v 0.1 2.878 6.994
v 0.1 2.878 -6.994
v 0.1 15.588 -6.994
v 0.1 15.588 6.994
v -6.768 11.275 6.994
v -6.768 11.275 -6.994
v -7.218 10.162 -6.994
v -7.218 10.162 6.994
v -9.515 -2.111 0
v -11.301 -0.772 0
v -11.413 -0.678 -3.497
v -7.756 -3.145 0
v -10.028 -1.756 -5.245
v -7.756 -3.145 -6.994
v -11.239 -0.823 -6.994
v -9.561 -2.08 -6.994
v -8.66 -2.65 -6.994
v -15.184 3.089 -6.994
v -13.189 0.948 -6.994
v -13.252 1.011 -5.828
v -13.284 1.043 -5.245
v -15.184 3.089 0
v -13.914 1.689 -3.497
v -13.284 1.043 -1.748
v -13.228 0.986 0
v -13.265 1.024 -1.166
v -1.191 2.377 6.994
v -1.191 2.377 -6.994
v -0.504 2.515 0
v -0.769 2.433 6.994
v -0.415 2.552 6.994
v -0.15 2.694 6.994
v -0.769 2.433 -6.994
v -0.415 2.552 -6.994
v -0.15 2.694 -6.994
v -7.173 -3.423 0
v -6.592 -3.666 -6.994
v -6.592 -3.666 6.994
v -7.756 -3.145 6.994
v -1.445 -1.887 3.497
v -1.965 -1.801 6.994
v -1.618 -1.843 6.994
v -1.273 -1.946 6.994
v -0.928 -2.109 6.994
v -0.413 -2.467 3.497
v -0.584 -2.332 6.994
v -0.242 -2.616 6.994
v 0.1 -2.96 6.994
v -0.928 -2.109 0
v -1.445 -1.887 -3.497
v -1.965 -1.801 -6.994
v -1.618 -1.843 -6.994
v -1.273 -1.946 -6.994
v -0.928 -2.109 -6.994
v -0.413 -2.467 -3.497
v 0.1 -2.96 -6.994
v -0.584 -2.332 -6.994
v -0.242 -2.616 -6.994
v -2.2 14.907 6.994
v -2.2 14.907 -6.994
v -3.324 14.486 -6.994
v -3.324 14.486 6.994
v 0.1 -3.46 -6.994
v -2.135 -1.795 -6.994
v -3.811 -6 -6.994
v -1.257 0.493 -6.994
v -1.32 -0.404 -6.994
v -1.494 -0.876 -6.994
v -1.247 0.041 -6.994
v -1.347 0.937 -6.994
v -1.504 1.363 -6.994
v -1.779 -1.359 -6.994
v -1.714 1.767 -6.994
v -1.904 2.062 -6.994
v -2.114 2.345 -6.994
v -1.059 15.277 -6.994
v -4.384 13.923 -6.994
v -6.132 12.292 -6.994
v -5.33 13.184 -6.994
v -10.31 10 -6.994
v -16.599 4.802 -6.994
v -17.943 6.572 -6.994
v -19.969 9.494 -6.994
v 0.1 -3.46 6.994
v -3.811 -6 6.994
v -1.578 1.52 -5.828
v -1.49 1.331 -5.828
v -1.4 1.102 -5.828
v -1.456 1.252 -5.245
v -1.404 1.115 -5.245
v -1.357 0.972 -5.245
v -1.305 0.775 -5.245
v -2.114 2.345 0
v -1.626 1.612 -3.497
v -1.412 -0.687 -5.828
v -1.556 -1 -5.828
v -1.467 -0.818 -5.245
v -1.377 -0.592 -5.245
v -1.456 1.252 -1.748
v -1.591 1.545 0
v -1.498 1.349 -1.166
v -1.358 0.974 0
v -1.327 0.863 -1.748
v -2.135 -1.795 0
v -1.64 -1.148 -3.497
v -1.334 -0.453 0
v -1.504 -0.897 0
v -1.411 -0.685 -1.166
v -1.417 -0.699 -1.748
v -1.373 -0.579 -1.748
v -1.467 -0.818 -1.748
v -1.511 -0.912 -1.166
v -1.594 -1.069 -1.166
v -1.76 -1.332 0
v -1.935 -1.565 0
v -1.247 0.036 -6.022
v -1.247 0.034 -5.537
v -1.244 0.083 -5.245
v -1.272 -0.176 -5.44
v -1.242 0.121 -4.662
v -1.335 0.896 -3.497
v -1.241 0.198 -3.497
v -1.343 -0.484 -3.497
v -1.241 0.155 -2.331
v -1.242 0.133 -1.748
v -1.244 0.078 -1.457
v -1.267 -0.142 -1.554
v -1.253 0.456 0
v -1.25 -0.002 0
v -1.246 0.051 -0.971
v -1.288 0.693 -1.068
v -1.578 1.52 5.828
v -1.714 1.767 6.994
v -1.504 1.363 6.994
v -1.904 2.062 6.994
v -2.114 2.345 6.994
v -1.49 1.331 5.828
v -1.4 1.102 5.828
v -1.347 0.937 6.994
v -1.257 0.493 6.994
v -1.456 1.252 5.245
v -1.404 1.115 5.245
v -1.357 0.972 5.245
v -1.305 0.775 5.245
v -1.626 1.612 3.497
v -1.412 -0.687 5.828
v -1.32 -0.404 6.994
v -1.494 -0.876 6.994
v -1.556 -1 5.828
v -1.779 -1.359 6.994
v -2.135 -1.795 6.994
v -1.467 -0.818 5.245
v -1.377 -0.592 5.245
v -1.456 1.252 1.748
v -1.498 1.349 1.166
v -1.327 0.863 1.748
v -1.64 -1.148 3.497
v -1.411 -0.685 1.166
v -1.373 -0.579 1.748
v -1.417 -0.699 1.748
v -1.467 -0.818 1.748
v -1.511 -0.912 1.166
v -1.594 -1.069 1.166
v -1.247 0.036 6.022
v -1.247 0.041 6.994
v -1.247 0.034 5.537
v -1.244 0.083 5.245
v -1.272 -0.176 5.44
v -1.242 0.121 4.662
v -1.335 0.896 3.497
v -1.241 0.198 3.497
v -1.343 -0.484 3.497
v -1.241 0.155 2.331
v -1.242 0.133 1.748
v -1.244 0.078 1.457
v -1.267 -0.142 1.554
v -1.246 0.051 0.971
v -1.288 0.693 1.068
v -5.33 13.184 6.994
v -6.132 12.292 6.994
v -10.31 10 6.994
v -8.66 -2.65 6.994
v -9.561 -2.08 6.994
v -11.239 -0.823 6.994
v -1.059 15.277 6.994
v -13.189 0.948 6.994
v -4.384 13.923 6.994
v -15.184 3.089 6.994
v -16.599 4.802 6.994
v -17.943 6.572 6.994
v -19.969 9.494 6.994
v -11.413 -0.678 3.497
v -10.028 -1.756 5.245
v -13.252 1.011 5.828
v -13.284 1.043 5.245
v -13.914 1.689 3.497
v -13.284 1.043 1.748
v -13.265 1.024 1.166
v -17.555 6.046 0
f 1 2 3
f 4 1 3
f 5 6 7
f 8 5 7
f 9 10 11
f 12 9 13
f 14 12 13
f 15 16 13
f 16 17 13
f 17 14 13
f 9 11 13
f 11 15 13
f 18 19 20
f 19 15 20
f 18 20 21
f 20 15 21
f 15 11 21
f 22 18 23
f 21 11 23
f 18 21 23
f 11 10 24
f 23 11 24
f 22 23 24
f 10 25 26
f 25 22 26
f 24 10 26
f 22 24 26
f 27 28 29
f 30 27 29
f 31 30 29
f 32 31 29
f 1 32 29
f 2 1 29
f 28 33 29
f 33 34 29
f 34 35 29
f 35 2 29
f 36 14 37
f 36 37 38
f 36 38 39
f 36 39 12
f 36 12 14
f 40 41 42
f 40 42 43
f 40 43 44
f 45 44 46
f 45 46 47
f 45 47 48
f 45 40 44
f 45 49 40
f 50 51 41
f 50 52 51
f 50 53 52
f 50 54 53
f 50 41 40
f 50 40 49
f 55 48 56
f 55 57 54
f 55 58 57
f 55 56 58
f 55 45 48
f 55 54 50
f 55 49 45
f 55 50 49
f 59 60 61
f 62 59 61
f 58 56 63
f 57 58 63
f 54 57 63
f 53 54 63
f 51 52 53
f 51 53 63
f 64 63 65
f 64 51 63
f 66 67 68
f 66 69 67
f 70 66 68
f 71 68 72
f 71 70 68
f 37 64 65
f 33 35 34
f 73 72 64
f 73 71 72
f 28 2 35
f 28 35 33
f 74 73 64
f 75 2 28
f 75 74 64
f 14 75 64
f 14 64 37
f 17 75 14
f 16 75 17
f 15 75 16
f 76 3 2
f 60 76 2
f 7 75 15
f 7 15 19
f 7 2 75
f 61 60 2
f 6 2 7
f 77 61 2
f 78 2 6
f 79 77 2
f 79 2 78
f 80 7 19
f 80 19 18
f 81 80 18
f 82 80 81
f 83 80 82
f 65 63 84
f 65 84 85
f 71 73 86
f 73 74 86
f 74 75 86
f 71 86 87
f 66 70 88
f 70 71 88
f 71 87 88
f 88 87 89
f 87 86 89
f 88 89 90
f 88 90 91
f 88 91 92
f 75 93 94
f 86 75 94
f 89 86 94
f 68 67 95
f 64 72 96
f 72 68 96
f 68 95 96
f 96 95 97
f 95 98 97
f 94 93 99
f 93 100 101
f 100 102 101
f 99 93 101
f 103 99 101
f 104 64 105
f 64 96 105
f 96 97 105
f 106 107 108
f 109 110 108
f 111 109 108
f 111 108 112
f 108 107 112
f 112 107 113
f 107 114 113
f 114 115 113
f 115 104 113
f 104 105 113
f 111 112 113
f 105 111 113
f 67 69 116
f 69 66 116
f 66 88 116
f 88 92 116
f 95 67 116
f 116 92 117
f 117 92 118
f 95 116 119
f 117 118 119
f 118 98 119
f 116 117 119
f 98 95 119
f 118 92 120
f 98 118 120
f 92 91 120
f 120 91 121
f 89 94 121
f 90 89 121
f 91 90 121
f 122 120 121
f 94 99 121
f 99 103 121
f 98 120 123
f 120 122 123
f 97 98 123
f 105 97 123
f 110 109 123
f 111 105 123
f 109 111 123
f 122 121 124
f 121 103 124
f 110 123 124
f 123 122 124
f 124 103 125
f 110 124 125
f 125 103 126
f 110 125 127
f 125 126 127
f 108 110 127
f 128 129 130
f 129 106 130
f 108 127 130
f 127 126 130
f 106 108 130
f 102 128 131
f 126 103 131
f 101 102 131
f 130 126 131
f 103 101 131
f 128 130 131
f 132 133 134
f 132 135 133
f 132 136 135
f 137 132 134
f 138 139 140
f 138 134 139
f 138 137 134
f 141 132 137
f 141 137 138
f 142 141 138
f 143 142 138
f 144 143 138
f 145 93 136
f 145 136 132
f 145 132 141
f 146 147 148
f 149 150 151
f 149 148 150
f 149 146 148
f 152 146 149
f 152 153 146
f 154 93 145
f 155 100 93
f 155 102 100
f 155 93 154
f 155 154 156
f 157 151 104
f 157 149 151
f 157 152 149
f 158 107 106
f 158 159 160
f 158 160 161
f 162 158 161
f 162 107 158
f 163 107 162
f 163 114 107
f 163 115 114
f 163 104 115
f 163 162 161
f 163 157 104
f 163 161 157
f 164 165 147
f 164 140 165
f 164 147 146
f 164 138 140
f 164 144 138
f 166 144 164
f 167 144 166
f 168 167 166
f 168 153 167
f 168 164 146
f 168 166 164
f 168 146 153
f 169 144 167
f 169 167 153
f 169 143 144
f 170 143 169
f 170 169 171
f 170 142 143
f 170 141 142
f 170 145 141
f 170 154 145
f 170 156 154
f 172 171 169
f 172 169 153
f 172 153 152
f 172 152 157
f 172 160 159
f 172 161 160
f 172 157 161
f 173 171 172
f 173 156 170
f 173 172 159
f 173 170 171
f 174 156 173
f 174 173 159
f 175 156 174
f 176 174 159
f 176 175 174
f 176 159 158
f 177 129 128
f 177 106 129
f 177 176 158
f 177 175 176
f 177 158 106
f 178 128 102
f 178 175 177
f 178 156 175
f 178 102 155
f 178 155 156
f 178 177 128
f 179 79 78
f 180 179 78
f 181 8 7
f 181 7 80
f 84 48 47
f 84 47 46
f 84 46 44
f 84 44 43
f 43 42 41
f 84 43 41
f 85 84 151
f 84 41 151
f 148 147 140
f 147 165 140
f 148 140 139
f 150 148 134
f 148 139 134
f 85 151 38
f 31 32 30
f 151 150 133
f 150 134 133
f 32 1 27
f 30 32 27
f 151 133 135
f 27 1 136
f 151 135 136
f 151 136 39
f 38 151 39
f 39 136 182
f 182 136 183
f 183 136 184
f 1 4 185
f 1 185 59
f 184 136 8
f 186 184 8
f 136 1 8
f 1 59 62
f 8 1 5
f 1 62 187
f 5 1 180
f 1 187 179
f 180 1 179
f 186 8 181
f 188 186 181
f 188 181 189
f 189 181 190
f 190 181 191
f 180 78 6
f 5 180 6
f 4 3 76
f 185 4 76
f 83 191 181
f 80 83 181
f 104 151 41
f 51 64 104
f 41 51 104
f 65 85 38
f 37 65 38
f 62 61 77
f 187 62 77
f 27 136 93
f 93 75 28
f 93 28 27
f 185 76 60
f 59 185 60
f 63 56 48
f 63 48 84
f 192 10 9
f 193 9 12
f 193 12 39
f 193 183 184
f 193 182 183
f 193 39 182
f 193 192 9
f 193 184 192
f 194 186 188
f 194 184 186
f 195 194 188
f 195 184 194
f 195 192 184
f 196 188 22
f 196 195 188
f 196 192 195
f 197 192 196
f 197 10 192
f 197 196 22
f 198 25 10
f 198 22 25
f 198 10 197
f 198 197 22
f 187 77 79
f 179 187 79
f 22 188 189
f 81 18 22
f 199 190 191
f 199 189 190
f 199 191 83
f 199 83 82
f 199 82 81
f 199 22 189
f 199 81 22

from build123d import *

# Parameters (mm, degrees)
CROQUIS_BASE_DEPTH              = 6.9937
LENTE_PPAL_1_REACH              = 29.176
LENTE_PPAL_1_DIRECTION_2_REACH  = 29.176
LENTE_PPAL_2_DEPTH              = 28.175928622
LENTE_PPAL_2_DEPTH_BACK         = 28.175928622
CROQUIS9_3_OUTSIDE_W            = 30.065
CROQUIS9_3_OUTSIDE_H            = 25.937
LENTE_FRONTAL_REACH             = 25.403
LENTE_FRONTAL_DIRECTION_2_REACH = 25.403
LENTE_TRASERA_REACH             = 28.281
LENTE_TRASERA_DIRECTION_2_REACH = 28.281


with BuildPart() as part:
    # Croquis1 → croquis base (new, symmetric)
    with BuildSketch(Plane.XY):
        with BuildLine():
            Line((-6.994875026, 10.477389992), (-8.981845695, 12.608155172))
            Line((-8.981845695, 12.608155172), (-23.035921146, 11.871612288))
            Line((-23.035921146, 11.871612288), (-23.035921146, 11.54013782))
            ThreePointArc((-23.035921146, 11.54013782), (-20.949684518, 9.582335705), (-18.945192114, 7.540918896))
            add(Edge.make_bspline(
                [(-18.945192114, 7.540918896), (-10.215008384, -3.697644103), (-2.846604825, -5.059081104)],
                knots=[0.497667241, 0.497667241, 0.497667241, 0.49955428, 0.49955428, 0.49955428], degree=2))
            add(Edge.make_bspline(
                [(-2.846604825, -5.059081104), (-2.498165198, -4.87297933), (-2.177330417, -4.684462446)],
                knots=[0.498812075, 0.498812075, 0.498812075, 0.498911556, 0.498911556, 0.498911556], degree=2))
            Line((-2.177330418, -4.684462446), (-2.177330418, 6.186438919))
            add(Edge.make_bspline(
                [(-2.177330418, 6.186438919), (-4.063319702, 8.141636997), (-6.994875026, 10.477389992)],
                knots=[0.50138293, 0.50138293, 0.50138293, 0.502013312, 0.502013312, 0.502013312], degree=2))
        make_face()
    extrude(amount=CROQUIS_BASE_DEPTH, both=True)

    # lente ppal 1: up to this face of the body (flat: up to its plane)
    lente_ppal_1_end = Plane(part.part.faces().sort_by_distance((-10.153546236, 5.159655324, 6.9937))[0])
    # Croquis9 → lente ppal 1 (add, up to the picked face)
    with BuildSketch(Plane.XY, mode=Mode.PRIVATE) as lente_ppal_1_sk1:
        with BuildLine():
            Line((-2.177330418, -4.388282022), (-2.177330418, -1.840420572))
            add(Edge.make_bspline(
                [(-2.177330418, 2.424232079), (-0.304369248, 0.128042884), (-2.177330418, -1.840420572)],
                knots=[0, 0, 0, 1, 1, 1], degree=2))
            Line((-2.177330418, 2.424232079), (-2.177330418, 6.082860828))
            Line((-2.177330418, 6.082860828), (-10.309820395, 10))
            Line((-10.309820395, 10), (-19.969359014, 9.493765032))
            add(Edge.make_bspline(
                [(-2.177330418, -4.388282022), (-10.4130765, -4.994158739), (-19.969359014, 9.493765032)],
                knots=[0, 0, 0, 1, 1, 1], degree=2))
        make_face()
    lente_ppal_1_tool1 = split(extrude(lente_ppal_1_sk1.sketch, amount=LENTE_PPAL_1_REACH, mode=Mode.PRIVATE), bisect_by=lente_ppal_1_end, keep=Keep.BOTH, mode=Mode.PRIVATE)
    add(lente_ppal_1_tool1.solids().sort_by(Axis((-9.106368, 3.599172, 0), (0, 0, 1)))[0])

    # lente ppal 1 direction 2: up to this face of the body (flat: up to its plane)
    lente_ppal_1_direction_2_end = Plane(part.part.faces().sort_by_distance((-10.153546236, 5.159655324, -6.9937))[0])
    # Croquis9 → lente ppal 1 direction 2 (add, up to the picked face)
    with BuildSketch(Plane.XY, mode=Mode.PRIVATE) as lente_ppal_1_direction_2_sk1:
        with BuildLine():
            Line((-2.177330418, -4.388282022), (-2.177330418, -1.840420572))
            add(Edge.make_bspline(
                [(-2.177330418, 2.424232079), (-0.304369248, 0.128042884), (-2.177330418, -1.840420572)],
                knots=[0, 0, 0, 1, 1, 1], degree=2))
            Line((-2.177330418, 2.424232079), (-2.177330418, 6.082860828))
            Line((-2.177330418, 6.082860828), (-10.309820395, 10))
            Line((-10.309820395, 10), (-19.969359014, 9.493765032))
            add(Edge.make_bspline(
                [(-2.177330418, -4.388282022), (-10.4130765, -4.994158739), (-19.969359014, 9.493765032)],
                knots=[0, 0, 0, 1, 1, 1], degree=2))
        make_face()
    lente_ppal_1_direction_2_tool1 = split(extrude(lente_ppal_1_direction_2_sk1.sketch, amount=-LENTE_PPAL_1_DIRECTION_2_REACH, mode=Mode.PRIVATE), bisect_by=lente_ppal_1_direction_2_end, keep=Keep.BOTH, mode=Mode.PRIVATE)
    add(lente_ppal_1_direction_2_tool1.solids().sort_by(Axis((-9.106368, 3.599172, 0), (0, 0, -1)))[0])

    # Croquis9<3> outside → lente ppal 2 (cut, two sides: drawn at the far end of the back side and taken through both)
    with BuildSketch(Plane.XY.offset(-LENTE_PPAL_2_DEPTH_BACK)):
        with Locations((-12.1385, 3.7745)):
            Rectangle(CROQUIS9_3_OUTSIDE_W, CROQUIS9_3_OUTSIDE_H)
        with BuildLine():
            Line((-2.177330418, -1.840420572), (-2.177330418, -4.388282022))
            add(Edge.make_bspline(
                [(-2.177330418, -4.388282022), (-10.4130765, -4.994158739), (-19.969359014, 9.493765032)],
                knots=[0, 0, 0, 1, 1, 1], degree=2))
            Line((-19.969359014, 9.493765032), (-10.309820395, 10))
            Line((-10.309820395, 10), (-2.177330418, 6.082860828))
            Line((-2.177330418, 6.082860828), (-2.177330418, 2.424232079))
            add(Edge.make_bspline(
                [(-2.177330418, 2.424232079), (-0.304369248, 0.128042884), (-2.177330418, -1.840420572)],
                knots=[0, 0, 0, 1, 1, 1], degree=2))
        make_face(mode=Mode.SUBTRACT)
    extrude(amount=LENTE_PPAL_2_DEPTH + LENTE_PPAL_2_DEPTH_BACK, mode=Mode.SUBTRACT)

    # lente frontal: up to this face of the body (flat: up to its plane)
    lente_frontal_end = Plane(part.part.faces().sort_by_distance((-9.106367081, 3.599171888, 6.9937))[0])
    # Croquis8 → lente frontal (add, up to the picked face)
    with BuildSketch(Plane.XY, mode=Mode.PRIVATE) as lente_frontal_sk1:
        with BuildLine():
            Line((0.1, 2.877673418), (0.1, 15.587903347))
            Line((0.1, 15.587903347), (-1.059110992, 15.277320493))
            Line((-1.059110992, 15.277320493), (-2.200378811, 14.9065001))
            Line((-2.200378811, 14.9065001), (-3.324385438, 14.486251242))
            Line((-3.324385438, 14.486251242), (-4.38392255, 13.922885367))
            Line((-4.38392255, 13.922885367), (-5.329535454, 13.184091597))
            Line((-5.329535454, 13.184091597), (-6.132492182, 12.292317806))
            Line((-6.132492182, 12.292317806), (-6.768395299, 11.274660091))
            Line((-6.768395299, 11.274660091), (-7.217923211, 10.162039465))
            Line((-7.217923211, 10.162039465), (-10.309820395, 10))
            Line((-10.309820395, 10), (-2.177330418, 2.342487007))
            Line((-2.177330418, 2.342487007), (-1.190501641, 2.376947827))
            add(Edge.make_bspline(
                [(-1.190501641, 2.376947827), (-0.463368169, 2.402339888), (0.1, 2.877673418)],
                knots=[0, 0, 0, 1, 1, 1], degree=2))
        make_face()
    lente_frontal_tool1 = split(extrude(lente_frontal_sk1.sketch, amount=LENTE_FRONTAL_REACH, mode=Mode.PRIVATE), bisect_by=lente_frontal_end, keep=Keep.BOTH, mode=Mode.PRIVATE)
    add(lente_frontal_tool1.solids().sort_by(Axis((-3.290182, 8.96302, 0), (0, 0, 1)))[0])

    # lente frontal direction 2: up to this face of the body (flat: up to its plane)
    lente_frontal_direction_2_end = Plane(part.part.faces().sort_by_distance((-9.106367081, 3.599171888, -6.9937))[0])
    # Croquis8 → lente frontal direction 2 (add, up to the picked face)
    with BuildSketch(Plane.XY, mode=Mode.PRIVATE) as lente_frontal_direction_2_sk1:
        with BuildLine():
            Line((0.1, 2.877673418), (0.1, 15.587903347))
            Line((0.1, 15.587903347), (-1.059110992, 15.277320493))
            Line((-1.059110992, 15.277320493), (-2.200378811, 14.9065001))
            Line((-2.200378811, 14.9065001), (-3.324385438, 14.486251242))
            Line((-3.324385438, 14.486251242), (-4.38392255, 13.922885367))
            Line((-4.38392255, 13.922885367), (-5.329535454, 13.184091597))
            Line((-5.329535454, 13.184091597), (-6.132492182, 12.292317806))
            Line((-6.132492182, 12.292317806), (-6.768395299, 11.274660091))
            Line((-6.768395299, 11.274660091), (-7.217923211, 10.162039465))
            Line((-7.217923211, 10.162039465), (-10.309820395, 10))
            Line((-10.309820395, 10), (-2.177330418, 2.342487007))
            Line((-2.177330418, 2.342487007), (-1.190501641, 2.376947827))
            add(Edge.make_bspline(
                [(-1.190501641, 2.376947827), (-0.463368169, 2.402339888), (0.1, 2.877673418)],
                knots=[0, 0, 0, 1, 1, 1], degree=2))
        make_face()
    lente_frontal_direction_2_tool1 = split(extrude(lente_frontal_direction_2_sk1.sketch, amount=-LENTE_FRONTAL_DIRECTION_2_REACH, mode=Mode.PRIVATE), bisect_by=lente_frontal_direction_2_end, keep=Keep.BOTH, mode=Mode.PRIVATE)
    add(lente_frontal_direction_2_tool1.solids().sort_by(Axis((-3.290182, 8.96302, 0), (0, 0, -1)))[0])

    # lente trasera: up to this face of the body (flat: up to its plane)
    lente_trasera_end = Plane(part.part.faces().sort_by_distance((-7.357064552, 5.305385386, 6.9937))[0])
    # Croquis11 → lente trasera (add, up to the picked face)
    with BuildSketch(Plane.XY, mode=Mode.PRIVATE) as lente_trasera_sk1:
        with BuildLine():
            Line((0.1, -2.960353775), (0.1, -3.460353775))
            Line((0.1, -3.460353775), (-3.810712242, -6))
            Line((-3.810712242, -6), (-9.112438619, -1.551323352))
            Line((-9.112438619, -1.551323352), (-1.965100505, -1.800913899))
            add(Edge.make_bspline(
                [(-1.965100505, -1.800913899), (-0.923066369, -1.837302533), (0.1, -2.960353775)],
                knots=[0, 0, 0, 1, 1, 1], degree=2))
        make_face()
    lente_trasera_tool1 = split(extrude(lente_trasera_sk1.sketch, amount=LENTE_TRASERA_REACH, mode=Mode.PRIVATE), bisect_by=lente_trasera_end, keep=Keep.BOTH, mode=Mode.PRIVATE)
    add(lente_trasera_tool1.solids().sort_by(Axis((-3.971821, -3.263775, 0), (0, 0, 1)))[0])

    # lente trasera direction 2: up to this face of the body (flat: up to its plane)
    lente_trasera_direction_2_end = Plane(part.part.faces().sort_by_distance((-7.357064552, 5.305385386, -6.9937))[0])
    # Croquis11 → lente trasera direction 2 (add, up to the picked face)
    with BuildSketch(Plane.XY, mode=Mode.PRIVATE) as lente_trasera_direction_2_sk1:
        with BuildLine():
            Line((0.1, -2.960353775), (0.1, -3.460353775))
            Line((0.1, -3.460353775), (-3.810712242, -6))
            Line((-3.810712242, -6), (-9.112438619, -1.551323352))
            Line((-9.112438619, -1.551323352), (-1.965100505, -1.800913899))
            add(Edge.make_bspline(
                [(-1.965100505, -1.800913899), (-0.923066369, -1.837302533), (0.1, -2.960353775)],
                knots=[0, 0, 0, 1, 1, 1], degree=2))
        make_face()
    lente_trasera_direction_2_tool1 = split(extrude(lente_trasera_direction_2_sk1.sketch, amount=-LENTE_TRASERA_DIRECTION_2_REACH, mode=Mode.PRIVATE), bisect_by=lente_trasera_direction_2_end, keep=Keep.BOTH, mode=Mode.PRIVATE)
    add(lente_trasera_direction_2_tool1.solids().sort_by(Axis((-3.971821, -3.263775, 0), (0, 0, -1)))[0])


solid = part.part
